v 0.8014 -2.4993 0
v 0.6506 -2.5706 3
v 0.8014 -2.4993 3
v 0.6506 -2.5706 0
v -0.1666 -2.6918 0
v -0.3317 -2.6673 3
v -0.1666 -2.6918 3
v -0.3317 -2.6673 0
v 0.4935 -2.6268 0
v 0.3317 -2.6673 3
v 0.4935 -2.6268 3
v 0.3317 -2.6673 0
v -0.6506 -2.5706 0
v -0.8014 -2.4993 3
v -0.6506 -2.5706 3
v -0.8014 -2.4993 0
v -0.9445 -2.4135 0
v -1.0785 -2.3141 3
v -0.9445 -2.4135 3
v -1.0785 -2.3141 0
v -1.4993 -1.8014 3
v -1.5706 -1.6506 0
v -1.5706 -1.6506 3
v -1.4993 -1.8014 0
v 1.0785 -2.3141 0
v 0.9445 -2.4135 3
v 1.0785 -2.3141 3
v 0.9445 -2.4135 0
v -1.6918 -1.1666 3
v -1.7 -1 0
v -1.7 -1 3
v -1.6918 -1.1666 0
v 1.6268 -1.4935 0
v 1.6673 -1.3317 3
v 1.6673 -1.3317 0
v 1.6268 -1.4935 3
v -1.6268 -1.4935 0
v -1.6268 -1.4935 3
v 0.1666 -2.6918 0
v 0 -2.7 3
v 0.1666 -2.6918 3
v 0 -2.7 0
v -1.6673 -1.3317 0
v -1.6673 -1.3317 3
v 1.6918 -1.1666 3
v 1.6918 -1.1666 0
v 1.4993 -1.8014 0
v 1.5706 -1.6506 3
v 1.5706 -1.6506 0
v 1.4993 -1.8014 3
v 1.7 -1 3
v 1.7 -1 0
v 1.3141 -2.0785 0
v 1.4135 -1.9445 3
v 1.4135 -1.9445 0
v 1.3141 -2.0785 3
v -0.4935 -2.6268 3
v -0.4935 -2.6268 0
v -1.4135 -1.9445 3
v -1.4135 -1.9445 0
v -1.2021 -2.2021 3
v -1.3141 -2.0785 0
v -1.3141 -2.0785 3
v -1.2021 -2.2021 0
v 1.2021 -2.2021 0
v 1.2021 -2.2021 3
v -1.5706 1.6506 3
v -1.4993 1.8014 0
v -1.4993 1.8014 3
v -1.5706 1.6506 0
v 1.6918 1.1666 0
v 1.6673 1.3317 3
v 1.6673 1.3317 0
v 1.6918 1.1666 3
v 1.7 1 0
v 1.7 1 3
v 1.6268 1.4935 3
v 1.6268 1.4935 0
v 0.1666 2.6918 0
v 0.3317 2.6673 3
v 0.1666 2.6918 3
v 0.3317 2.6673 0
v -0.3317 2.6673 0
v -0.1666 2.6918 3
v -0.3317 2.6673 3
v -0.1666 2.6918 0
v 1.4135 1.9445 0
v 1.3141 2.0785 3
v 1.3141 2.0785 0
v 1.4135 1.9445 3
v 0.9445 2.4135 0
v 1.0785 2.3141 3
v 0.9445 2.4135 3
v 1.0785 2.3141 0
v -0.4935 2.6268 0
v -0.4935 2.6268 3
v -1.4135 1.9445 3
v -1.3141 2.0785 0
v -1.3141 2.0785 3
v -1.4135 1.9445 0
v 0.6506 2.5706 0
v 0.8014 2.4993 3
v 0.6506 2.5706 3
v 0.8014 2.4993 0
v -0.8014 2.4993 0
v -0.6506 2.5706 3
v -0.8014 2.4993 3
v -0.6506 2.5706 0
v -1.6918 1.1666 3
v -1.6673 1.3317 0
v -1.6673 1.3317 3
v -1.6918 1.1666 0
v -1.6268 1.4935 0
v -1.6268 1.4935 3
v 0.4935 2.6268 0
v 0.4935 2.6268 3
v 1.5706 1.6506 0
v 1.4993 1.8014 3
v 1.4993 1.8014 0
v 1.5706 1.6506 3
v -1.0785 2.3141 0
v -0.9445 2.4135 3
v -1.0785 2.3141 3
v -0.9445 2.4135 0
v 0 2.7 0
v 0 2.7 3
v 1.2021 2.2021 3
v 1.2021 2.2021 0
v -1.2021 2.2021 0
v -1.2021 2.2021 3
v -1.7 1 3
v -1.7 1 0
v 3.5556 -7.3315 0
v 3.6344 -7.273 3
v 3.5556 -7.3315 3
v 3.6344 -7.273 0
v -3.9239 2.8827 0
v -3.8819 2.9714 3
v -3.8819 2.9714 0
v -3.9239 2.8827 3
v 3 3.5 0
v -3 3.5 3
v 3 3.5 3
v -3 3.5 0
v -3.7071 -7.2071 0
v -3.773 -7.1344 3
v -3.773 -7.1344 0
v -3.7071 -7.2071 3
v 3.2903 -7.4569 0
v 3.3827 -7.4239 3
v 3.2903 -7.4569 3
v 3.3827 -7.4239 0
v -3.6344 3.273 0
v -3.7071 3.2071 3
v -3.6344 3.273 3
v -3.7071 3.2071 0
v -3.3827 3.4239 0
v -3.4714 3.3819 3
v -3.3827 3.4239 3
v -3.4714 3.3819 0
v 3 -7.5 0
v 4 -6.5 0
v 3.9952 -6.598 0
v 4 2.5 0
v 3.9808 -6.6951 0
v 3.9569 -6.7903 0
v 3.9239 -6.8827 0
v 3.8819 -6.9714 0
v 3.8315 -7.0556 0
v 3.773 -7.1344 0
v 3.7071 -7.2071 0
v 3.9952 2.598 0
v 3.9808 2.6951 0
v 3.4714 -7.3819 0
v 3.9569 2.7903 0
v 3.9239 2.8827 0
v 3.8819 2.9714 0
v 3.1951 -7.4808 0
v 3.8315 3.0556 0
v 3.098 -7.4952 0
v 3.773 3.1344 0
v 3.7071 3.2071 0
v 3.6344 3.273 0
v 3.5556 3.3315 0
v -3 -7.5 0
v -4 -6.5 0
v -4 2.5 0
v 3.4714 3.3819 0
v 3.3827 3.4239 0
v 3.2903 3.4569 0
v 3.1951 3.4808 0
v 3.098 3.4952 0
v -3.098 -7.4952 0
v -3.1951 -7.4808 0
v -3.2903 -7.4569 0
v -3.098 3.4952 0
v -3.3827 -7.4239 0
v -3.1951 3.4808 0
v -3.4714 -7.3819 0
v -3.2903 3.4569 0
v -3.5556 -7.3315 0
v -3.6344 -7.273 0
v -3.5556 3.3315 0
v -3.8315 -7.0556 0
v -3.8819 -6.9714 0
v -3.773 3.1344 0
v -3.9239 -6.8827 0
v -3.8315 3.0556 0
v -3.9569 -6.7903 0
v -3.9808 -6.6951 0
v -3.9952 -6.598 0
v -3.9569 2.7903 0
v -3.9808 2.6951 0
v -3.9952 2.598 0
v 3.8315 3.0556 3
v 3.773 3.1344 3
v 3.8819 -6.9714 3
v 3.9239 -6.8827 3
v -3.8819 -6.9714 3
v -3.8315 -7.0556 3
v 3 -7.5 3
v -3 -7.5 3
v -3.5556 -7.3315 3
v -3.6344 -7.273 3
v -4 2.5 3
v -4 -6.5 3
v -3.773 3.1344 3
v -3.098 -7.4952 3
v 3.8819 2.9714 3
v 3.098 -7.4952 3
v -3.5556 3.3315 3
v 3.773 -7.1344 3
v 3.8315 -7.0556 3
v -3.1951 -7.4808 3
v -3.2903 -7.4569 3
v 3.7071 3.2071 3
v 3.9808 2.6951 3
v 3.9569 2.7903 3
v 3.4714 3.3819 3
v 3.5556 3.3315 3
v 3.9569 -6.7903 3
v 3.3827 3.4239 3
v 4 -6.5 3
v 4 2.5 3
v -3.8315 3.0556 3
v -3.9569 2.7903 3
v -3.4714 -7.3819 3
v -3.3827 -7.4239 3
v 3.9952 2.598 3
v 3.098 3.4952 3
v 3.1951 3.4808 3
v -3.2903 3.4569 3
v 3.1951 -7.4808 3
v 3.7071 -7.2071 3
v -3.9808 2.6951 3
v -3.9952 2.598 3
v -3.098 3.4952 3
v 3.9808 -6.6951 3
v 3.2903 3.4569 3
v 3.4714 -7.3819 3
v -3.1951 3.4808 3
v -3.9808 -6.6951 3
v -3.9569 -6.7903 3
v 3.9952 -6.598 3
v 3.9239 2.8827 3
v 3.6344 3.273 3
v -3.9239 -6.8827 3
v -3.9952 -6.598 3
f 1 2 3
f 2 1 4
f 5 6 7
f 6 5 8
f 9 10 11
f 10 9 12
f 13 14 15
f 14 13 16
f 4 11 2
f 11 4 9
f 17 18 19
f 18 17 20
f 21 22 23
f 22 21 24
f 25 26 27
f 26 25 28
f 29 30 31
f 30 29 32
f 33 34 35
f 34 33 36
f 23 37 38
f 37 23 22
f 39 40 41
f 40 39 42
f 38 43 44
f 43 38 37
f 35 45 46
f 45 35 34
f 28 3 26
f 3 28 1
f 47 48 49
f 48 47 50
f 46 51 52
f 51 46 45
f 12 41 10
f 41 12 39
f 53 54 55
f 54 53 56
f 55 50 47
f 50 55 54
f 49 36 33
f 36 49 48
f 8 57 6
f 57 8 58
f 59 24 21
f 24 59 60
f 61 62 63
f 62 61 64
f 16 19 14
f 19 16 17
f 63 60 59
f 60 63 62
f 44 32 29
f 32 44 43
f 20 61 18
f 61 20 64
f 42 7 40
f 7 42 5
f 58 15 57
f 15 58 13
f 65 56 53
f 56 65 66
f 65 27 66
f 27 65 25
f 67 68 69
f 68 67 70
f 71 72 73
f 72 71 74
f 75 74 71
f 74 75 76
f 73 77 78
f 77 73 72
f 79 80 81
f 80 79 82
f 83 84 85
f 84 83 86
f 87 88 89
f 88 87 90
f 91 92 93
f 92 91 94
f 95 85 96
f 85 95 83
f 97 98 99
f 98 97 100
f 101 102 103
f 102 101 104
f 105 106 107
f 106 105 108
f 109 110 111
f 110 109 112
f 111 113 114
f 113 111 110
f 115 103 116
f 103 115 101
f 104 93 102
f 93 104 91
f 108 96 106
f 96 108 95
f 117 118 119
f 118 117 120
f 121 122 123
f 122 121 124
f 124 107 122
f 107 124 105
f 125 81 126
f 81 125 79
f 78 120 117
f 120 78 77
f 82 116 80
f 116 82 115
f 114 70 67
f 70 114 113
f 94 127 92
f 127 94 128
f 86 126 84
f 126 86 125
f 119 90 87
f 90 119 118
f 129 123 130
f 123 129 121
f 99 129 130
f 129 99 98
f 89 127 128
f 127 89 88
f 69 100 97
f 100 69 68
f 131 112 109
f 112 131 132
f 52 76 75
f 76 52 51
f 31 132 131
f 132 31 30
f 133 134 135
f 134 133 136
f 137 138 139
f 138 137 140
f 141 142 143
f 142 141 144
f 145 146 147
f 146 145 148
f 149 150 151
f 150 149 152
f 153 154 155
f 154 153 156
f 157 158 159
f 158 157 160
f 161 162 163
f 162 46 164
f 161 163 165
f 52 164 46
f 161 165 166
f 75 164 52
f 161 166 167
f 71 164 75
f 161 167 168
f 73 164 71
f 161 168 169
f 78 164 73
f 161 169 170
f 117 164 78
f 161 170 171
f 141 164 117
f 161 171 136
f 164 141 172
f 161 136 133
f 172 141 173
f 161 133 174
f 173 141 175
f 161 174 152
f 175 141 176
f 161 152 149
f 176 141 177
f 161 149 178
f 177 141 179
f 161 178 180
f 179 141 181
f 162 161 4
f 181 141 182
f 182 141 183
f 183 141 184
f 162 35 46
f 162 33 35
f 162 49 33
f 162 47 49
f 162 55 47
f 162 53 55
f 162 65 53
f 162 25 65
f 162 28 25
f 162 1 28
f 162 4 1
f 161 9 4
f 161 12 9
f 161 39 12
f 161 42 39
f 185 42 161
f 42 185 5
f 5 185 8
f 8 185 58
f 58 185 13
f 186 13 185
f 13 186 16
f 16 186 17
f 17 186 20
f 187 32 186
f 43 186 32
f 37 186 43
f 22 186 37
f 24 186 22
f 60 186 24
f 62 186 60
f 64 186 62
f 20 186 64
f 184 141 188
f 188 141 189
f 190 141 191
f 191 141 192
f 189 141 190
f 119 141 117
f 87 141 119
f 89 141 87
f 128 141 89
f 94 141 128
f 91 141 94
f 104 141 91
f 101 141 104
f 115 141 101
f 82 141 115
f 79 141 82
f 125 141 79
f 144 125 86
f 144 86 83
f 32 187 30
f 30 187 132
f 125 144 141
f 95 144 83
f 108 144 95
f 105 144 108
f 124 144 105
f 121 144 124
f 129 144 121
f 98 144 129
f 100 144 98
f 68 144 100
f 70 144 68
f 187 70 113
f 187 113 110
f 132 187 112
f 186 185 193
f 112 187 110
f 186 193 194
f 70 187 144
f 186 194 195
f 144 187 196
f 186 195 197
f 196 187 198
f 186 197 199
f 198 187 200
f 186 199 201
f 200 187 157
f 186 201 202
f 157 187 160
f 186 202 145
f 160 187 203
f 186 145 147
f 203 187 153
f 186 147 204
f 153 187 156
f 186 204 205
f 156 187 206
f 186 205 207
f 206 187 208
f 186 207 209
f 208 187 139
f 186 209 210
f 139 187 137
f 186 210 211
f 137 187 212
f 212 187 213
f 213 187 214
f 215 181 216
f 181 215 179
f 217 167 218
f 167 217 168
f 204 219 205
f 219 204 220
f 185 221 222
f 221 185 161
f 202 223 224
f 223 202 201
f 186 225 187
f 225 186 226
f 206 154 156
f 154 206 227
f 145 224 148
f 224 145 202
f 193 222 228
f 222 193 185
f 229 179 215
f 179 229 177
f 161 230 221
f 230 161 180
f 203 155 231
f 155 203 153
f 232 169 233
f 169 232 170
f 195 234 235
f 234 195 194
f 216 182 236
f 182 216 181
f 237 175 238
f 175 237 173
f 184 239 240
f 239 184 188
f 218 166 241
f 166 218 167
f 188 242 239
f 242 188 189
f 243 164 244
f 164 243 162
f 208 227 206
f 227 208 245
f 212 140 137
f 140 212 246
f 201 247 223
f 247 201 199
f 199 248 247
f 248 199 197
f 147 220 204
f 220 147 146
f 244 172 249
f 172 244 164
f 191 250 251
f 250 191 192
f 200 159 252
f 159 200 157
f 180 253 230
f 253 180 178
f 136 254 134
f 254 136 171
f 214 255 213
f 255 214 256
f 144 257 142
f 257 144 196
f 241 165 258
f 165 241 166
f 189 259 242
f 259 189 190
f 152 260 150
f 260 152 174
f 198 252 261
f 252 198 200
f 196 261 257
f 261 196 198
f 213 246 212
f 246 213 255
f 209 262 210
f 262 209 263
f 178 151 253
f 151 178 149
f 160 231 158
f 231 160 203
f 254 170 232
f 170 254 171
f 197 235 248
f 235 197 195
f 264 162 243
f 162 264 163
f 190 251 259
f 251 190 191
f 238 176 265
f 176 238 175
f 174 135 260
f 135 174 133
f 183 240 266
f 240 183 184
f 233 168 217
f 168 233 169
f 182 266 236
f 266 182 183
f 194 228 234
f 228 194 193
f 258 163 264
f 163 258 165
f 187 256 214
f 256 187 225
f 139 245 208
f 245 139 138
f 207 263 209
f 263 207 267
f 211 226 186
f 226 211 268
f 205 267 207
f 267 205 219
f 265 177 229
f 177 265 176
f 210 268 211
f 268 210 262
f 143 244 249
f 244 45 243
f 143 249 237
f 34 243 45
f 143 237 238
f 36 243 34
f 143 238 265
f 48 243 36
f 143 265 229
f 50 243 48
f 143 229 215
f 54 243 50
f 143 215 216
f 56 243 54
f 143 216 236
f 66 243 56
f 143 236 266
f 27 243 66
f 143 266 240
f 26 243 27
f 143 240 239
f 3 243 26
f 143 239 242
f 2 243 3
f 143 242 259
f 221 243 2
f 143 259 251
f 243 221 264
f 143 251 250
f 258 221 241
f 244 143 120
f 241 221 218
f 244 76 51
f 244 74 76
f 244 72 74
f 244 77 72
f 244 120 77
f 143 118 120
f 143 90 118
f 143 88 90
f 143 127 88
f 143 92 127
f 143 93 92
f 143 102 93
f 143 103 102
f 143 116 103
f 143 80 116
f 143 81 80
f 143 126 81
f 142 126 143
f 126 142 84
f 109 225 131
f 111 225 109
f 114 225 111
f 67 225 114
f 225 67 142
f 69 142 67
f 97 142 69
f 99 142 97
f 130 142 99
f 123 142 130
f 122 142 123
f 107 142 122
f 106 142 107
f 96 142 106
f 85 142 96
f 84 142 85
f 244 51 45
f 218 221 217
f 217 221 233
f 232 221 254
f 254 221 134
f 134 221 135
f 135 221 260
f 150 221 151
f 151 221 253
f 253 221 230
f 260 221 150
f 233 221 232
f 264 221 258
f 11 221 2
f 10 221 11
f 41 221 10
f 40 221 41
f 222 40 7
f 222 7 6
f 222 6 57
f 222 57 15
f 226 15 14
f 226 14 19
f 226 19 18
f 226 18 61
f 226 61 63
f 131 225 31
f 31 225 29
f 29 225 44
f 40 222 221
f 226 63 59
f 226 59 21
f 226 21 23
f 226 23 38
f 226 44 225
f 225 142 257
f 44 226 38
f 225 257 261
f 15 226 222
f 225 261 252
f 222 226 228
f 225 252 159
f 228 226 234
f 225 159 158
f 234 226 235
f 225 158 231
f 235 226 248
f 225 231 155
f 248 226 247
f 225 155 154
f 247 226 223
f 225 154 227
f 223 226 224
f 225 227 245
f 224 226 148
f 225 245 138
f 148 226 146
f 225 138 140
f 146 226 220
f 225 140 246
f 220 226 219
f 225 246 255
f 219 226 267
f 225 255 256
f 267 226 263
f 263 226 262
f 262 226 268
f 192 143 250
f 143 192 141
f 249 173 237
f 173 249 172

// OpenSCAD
// VMax external draft 1; mm; generated by external-enclosure-v1.py
difference(){translate([0,-2,0]){linear_extrude(height=3)polygon(points=[[4.0, 4.5], [3.995184726672197, 4.598017140329561], [3.9807852804032304, 4.695090322016128], [3.9569403357322086, 4.790284677254462], [3.923879532511287, 4.88268343236509], [3.881921264348355, 4.971396736825998], [3.8314696123025453, 5.055570233019602], [3.773010453362737, 5.134393284163646], [3.7071067811865475, 5.207106781186548], [3.6343932841636457, 5.273010453362737], [3.555570233019602, 5.331469612302545], [3.4713967368259975, 5.381921264348355], [3.3826834323650896, 5.423879532511287], [3.2902846772544625, 5.456940335732209], [3.1950903220161284, 5.48078528040323], [3.0980171403295604, 5.495184726672197], [3.0, 5.5], [-3.0, 5.5], [-3.0980171403295604, 5.495184726672197], [-3.195090322016128, 5.48078528040323], [-3.2902846772544625, 5.456940335732209], [-3.3826834323650896, 5.423879532511287], [-3.471396736825998, 5.381921264348355], [-3.555570233019602, 5.331469612302545], [-3.6343932841636453, 5.273010453362737], [-3.7071067811865475, 5.207106781186548], [-3.773010453362737, 5.134393284163646], [-3.8314696123025453, 5.055570233019602], [-3.881921264348355, 4.971396736825998], [-3.923879532511287, 4.88268343236509], [-3.9569403357322086, 4.790284677254462], [-3.9807852804032304, 4.695090322016128], [-3.9951847266721967, 4.598017140329561], [-4.0, 4.5], [-4.0, -4.5], [-3.995184726672197, -4.598017140329561], [-3.9807852804032304, -4.695090322016128], [-3.956940335732209, -4.790284677254462], [-3.923879532511287, -4.88268343236509], [-3.881921264348355, -4.971396736825998], [-3.8314696123025453, -5.055570233019602], [-3.773010453362737, -5.134393284163645], [-3.707106781186548, -5.207106781186548], [-3.6343932841636457, -5.273010453362737], [-3.555570233019602, -5.331469612302545], [-3.471396736825998, -5.381921264348355], [-3.3826834323650896, -5.423879532511287], [-3.2902846772544625, -5.456940335732209], [-3.195090322016129, -5.48078528040323], [-3.0980171403295604, -5.495184726672197], [-3.0, -5.5], [3.0, -5.5], [3.09801714032956, -5.495184726672197], [3.1950903220161284, -5.48078528040323], [3.290284677254462, -5.456940335732209], [3.38268343236509, -5.423879532511287], [3.4713967368259975, -5.381921264348355], [3.5555702330196017, -5.331469612302546], [3.6343932841636457, -5.273010453362737], [3.7071067811865475, -5.207106781186548], [3.7730104533627373, -5.134393284163645], [3.8314696123025453, -5.055570233019602], [3.881921264348355, -4.971396736825998], [3.923879532511287, -4.88268343236509], [3.9569403357322086, -4.790284677254462], [3.9807852804032304, -4.695090322016129], [3.995184726672197, -4.598017140329561], [4.0, -4.5]]);}union(){union(){translate([0,-1,-1]){cylinder(h=5,r=1.7,$fn=64);}translate([0,1,-1]){cylinder(h=5,r=1.7,$fn=64);}}translate([0,0,-1]){translate([-1.7,-1.0,0])cube([3.4,2,5]);}}}
